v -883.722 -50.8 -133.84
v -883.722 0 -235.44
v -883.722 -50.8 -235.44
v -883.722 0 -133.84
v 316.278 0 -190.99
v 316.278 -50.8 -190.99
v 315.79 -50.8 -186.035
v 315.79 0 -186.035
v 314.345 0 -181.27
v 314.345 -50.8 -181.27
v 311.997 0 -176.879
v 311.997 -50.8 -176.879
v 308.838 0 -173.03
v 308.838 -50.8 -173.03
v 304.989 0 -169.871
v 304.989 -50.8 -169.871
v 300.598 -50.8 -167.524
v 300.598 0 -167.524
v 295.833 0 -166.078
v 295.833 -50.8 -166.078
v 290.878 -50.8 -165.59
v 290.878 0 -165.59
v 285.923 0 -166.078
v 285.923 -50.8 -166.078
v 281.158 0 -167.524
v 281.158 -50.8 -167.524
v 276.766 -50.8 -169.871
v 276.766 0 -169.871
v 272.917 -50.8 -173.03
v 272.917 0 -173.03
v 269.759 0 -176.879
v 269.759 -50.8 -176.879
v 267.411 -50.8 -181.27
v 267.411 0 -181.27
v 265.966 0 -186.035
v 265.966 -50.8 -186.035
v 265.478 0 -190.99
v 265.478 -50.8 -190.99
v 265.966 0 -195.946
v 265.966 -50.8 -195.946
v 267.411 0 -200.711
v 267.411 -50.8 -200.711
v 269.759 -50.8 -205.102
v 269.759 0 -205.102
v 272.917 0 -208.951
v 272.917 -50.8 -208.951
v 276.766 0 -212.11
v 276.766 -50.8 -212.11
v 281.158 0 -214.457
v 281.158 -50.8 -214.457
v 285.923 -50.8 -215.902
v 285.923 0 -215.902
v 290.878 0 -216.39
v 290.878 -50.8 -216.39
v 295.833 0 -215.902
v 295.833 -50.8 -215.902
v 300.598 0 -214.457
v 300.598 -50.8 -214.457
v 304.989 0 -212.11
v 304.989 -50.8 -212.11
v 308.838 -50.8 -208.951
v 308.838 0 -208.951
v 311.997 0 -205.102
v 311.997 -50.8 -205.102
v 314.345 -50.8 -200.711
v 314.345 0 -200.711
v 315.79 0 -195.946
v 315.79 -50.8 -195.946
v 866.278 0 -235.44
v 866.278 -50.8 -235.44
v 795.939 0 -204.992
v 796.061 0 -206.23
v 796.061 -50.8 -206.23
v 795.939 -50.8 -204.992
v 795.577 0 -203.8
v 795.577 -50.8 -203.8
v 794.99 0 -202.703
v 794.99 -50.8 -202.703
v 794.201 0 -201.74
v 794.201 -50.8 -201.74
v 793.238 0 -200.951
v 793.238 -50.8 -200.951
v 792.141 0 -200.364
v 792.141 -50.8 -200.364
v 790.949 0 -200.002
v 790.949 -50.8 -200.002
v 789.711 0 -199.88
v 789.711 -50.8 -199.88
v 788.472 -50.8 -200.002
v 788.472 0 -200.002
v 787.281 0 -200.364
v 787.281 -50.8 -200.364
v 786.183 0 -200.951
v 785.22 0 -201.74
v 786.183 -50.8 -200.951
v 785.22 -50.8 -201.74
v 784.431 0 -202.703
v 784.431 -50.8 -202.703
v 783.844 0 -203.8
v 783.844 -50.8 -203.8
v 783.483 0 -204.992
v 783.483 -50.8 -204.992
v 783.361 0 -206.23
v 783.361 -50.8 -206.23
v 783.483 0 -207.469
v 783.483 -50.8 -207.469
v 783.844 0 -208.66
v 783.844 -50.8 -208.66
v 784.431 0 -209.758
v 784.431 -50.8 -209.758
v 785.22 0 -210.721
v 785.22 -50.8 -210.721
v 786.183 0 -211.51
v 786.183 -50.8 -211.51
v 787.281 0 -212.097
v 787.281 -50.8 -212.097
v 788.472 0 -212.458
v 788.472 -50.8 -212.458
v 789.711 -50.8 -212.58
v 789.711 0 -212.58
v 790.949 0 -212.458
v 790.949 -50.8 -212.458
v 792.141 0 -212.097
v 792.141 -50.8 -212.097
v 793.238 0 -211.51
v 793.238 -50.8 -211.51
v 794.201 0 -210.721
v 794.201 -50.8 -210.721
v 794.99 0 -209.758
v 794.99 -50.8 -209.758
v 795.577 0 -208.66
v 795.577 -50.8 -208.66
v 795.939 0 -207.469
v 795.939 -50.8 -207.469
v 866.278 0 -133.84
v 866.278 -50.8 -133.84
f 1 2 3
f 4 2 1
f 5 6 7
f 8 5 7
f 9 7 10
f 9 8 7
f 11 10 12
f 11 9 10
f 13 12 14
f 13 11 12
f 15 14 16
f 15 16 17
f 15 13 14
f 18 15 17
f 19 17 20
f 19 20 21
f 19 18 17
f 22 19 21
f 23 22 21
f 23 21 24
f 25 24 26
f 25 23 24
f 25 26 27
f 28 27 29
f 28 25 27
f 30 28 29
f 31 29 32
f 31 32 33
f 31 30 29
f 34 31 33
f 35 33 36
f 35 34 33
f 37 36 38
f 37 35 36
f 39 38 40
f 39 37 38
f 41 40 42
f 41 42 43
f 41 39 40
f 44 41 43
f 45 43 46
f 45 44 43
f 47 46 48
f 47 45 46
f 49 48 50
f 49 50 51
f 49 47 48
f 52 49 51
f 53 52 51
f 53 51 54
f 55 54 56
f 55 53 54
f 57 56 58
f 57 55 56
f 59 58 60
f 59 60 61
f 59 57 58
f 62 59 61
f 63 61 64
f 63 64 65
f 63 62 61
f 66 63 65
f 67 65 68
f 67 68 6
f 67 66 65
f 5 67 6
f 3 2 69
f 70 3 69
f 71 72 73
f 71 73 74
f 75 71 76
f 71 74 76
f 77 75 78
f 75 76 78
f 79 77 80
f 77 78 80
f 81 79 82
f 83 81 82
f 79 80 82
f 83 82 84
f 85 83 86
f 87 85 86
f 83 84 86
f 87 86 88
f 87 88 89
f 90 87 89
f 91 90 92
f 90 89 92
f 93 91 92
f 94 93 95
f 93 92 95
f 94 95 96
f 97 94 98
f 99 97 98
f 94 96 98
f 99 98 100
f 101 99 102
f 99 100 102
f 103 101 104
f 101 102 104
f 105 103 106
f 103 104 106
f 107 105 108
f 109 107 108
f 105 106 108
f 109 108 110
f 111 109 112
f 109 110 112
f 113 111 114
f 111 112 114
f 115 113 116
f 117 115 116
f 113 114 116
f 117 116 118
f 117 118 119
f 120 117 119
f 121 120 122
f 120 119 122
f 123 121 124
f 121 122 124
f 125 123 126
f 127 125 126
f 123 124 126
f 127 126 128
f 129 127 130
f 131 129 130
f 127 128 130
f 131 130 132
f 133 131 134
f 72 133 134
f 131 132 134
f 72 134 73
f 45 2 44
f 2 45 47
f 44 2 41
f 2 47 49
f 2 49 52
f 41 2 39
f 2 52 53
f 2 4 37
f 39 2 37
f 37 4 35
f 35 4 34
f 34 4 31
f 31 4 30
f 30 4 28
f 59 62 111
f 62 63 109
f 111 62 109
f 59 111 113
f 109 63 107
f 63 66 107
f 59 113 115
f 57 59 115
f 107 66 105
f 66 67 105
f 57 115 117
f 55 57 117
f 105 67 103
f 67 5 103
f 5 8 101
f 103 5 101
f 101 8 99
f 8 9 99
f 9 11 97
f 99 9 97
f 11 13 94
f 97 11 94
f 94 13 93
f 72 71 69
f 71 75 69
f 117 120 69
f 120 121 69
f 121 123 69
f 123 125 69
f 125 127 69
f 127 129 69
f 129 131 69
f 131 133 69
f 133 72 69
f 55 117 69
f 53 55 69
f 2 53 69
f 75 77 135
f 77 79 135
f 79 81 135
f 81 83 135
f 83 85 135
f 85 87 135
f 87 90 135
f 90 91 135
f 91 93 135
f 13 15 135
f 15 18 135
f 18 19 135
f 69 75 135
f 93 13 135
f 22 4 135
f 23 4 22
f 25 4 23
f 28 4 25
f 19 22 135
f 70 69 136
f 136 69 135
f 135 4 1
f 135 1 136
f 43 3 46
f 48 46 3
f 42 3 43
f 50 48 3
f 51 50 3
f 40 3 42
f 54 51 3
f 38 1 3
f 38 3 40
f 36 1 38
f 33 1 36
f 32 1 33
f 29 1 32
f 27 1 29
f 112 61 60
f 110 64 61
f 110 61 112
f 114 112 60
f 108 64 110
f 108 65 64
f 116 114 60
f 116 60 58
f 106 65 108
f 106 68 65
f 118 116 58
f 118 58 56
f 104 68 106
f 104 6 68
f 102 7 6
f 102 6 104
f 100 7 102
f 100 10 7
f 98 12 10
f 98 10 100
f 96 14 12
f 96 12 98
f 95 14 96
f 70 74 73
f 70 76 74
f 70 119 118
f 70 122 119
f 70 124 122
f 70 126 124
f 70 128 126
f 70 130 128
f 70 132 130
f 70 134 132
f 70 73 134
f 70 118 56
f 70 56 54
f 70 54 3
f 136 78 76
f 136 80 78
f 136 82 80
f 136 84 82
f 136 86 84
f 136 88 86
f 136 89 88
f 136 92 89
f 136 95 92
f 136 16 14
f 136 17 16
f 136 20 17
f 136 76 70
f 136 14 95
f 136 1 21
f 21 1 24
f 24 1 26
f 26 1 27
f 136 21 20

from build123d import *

# Parameters (mm, degrees)
F0_W     = 1750
F0_H     = 101.6
F0_R     = 25.4
F1_DEPTH = 50.8
F2_R     = 6.35
F3_DEPTH = 50.8


with BuildPart() as f1:
    # F0 (on Front) → F1 (new body)
    with BuildSketch(Plane.XZ):
        with Locations((-8.72202, -184.640433)):
            Rectangle(F0_W, F0_H)
        with Locations((290.87798, -190.990433)):
            Circle(F0_R, mode=Mode.SUBTRACT)
    extrude(amount=F1_DEPTH)

    # F2 (on face) → F3 (cut)
    with BuildSketch(Plane.XZ.offset(50.8)):
        with Locations((789.710581, -206.230433)):
            Circle(F2_R)
    extrude(amount=-F3_DEPTH, mode=Mode.SUBTRACT)


solid = f1.part
